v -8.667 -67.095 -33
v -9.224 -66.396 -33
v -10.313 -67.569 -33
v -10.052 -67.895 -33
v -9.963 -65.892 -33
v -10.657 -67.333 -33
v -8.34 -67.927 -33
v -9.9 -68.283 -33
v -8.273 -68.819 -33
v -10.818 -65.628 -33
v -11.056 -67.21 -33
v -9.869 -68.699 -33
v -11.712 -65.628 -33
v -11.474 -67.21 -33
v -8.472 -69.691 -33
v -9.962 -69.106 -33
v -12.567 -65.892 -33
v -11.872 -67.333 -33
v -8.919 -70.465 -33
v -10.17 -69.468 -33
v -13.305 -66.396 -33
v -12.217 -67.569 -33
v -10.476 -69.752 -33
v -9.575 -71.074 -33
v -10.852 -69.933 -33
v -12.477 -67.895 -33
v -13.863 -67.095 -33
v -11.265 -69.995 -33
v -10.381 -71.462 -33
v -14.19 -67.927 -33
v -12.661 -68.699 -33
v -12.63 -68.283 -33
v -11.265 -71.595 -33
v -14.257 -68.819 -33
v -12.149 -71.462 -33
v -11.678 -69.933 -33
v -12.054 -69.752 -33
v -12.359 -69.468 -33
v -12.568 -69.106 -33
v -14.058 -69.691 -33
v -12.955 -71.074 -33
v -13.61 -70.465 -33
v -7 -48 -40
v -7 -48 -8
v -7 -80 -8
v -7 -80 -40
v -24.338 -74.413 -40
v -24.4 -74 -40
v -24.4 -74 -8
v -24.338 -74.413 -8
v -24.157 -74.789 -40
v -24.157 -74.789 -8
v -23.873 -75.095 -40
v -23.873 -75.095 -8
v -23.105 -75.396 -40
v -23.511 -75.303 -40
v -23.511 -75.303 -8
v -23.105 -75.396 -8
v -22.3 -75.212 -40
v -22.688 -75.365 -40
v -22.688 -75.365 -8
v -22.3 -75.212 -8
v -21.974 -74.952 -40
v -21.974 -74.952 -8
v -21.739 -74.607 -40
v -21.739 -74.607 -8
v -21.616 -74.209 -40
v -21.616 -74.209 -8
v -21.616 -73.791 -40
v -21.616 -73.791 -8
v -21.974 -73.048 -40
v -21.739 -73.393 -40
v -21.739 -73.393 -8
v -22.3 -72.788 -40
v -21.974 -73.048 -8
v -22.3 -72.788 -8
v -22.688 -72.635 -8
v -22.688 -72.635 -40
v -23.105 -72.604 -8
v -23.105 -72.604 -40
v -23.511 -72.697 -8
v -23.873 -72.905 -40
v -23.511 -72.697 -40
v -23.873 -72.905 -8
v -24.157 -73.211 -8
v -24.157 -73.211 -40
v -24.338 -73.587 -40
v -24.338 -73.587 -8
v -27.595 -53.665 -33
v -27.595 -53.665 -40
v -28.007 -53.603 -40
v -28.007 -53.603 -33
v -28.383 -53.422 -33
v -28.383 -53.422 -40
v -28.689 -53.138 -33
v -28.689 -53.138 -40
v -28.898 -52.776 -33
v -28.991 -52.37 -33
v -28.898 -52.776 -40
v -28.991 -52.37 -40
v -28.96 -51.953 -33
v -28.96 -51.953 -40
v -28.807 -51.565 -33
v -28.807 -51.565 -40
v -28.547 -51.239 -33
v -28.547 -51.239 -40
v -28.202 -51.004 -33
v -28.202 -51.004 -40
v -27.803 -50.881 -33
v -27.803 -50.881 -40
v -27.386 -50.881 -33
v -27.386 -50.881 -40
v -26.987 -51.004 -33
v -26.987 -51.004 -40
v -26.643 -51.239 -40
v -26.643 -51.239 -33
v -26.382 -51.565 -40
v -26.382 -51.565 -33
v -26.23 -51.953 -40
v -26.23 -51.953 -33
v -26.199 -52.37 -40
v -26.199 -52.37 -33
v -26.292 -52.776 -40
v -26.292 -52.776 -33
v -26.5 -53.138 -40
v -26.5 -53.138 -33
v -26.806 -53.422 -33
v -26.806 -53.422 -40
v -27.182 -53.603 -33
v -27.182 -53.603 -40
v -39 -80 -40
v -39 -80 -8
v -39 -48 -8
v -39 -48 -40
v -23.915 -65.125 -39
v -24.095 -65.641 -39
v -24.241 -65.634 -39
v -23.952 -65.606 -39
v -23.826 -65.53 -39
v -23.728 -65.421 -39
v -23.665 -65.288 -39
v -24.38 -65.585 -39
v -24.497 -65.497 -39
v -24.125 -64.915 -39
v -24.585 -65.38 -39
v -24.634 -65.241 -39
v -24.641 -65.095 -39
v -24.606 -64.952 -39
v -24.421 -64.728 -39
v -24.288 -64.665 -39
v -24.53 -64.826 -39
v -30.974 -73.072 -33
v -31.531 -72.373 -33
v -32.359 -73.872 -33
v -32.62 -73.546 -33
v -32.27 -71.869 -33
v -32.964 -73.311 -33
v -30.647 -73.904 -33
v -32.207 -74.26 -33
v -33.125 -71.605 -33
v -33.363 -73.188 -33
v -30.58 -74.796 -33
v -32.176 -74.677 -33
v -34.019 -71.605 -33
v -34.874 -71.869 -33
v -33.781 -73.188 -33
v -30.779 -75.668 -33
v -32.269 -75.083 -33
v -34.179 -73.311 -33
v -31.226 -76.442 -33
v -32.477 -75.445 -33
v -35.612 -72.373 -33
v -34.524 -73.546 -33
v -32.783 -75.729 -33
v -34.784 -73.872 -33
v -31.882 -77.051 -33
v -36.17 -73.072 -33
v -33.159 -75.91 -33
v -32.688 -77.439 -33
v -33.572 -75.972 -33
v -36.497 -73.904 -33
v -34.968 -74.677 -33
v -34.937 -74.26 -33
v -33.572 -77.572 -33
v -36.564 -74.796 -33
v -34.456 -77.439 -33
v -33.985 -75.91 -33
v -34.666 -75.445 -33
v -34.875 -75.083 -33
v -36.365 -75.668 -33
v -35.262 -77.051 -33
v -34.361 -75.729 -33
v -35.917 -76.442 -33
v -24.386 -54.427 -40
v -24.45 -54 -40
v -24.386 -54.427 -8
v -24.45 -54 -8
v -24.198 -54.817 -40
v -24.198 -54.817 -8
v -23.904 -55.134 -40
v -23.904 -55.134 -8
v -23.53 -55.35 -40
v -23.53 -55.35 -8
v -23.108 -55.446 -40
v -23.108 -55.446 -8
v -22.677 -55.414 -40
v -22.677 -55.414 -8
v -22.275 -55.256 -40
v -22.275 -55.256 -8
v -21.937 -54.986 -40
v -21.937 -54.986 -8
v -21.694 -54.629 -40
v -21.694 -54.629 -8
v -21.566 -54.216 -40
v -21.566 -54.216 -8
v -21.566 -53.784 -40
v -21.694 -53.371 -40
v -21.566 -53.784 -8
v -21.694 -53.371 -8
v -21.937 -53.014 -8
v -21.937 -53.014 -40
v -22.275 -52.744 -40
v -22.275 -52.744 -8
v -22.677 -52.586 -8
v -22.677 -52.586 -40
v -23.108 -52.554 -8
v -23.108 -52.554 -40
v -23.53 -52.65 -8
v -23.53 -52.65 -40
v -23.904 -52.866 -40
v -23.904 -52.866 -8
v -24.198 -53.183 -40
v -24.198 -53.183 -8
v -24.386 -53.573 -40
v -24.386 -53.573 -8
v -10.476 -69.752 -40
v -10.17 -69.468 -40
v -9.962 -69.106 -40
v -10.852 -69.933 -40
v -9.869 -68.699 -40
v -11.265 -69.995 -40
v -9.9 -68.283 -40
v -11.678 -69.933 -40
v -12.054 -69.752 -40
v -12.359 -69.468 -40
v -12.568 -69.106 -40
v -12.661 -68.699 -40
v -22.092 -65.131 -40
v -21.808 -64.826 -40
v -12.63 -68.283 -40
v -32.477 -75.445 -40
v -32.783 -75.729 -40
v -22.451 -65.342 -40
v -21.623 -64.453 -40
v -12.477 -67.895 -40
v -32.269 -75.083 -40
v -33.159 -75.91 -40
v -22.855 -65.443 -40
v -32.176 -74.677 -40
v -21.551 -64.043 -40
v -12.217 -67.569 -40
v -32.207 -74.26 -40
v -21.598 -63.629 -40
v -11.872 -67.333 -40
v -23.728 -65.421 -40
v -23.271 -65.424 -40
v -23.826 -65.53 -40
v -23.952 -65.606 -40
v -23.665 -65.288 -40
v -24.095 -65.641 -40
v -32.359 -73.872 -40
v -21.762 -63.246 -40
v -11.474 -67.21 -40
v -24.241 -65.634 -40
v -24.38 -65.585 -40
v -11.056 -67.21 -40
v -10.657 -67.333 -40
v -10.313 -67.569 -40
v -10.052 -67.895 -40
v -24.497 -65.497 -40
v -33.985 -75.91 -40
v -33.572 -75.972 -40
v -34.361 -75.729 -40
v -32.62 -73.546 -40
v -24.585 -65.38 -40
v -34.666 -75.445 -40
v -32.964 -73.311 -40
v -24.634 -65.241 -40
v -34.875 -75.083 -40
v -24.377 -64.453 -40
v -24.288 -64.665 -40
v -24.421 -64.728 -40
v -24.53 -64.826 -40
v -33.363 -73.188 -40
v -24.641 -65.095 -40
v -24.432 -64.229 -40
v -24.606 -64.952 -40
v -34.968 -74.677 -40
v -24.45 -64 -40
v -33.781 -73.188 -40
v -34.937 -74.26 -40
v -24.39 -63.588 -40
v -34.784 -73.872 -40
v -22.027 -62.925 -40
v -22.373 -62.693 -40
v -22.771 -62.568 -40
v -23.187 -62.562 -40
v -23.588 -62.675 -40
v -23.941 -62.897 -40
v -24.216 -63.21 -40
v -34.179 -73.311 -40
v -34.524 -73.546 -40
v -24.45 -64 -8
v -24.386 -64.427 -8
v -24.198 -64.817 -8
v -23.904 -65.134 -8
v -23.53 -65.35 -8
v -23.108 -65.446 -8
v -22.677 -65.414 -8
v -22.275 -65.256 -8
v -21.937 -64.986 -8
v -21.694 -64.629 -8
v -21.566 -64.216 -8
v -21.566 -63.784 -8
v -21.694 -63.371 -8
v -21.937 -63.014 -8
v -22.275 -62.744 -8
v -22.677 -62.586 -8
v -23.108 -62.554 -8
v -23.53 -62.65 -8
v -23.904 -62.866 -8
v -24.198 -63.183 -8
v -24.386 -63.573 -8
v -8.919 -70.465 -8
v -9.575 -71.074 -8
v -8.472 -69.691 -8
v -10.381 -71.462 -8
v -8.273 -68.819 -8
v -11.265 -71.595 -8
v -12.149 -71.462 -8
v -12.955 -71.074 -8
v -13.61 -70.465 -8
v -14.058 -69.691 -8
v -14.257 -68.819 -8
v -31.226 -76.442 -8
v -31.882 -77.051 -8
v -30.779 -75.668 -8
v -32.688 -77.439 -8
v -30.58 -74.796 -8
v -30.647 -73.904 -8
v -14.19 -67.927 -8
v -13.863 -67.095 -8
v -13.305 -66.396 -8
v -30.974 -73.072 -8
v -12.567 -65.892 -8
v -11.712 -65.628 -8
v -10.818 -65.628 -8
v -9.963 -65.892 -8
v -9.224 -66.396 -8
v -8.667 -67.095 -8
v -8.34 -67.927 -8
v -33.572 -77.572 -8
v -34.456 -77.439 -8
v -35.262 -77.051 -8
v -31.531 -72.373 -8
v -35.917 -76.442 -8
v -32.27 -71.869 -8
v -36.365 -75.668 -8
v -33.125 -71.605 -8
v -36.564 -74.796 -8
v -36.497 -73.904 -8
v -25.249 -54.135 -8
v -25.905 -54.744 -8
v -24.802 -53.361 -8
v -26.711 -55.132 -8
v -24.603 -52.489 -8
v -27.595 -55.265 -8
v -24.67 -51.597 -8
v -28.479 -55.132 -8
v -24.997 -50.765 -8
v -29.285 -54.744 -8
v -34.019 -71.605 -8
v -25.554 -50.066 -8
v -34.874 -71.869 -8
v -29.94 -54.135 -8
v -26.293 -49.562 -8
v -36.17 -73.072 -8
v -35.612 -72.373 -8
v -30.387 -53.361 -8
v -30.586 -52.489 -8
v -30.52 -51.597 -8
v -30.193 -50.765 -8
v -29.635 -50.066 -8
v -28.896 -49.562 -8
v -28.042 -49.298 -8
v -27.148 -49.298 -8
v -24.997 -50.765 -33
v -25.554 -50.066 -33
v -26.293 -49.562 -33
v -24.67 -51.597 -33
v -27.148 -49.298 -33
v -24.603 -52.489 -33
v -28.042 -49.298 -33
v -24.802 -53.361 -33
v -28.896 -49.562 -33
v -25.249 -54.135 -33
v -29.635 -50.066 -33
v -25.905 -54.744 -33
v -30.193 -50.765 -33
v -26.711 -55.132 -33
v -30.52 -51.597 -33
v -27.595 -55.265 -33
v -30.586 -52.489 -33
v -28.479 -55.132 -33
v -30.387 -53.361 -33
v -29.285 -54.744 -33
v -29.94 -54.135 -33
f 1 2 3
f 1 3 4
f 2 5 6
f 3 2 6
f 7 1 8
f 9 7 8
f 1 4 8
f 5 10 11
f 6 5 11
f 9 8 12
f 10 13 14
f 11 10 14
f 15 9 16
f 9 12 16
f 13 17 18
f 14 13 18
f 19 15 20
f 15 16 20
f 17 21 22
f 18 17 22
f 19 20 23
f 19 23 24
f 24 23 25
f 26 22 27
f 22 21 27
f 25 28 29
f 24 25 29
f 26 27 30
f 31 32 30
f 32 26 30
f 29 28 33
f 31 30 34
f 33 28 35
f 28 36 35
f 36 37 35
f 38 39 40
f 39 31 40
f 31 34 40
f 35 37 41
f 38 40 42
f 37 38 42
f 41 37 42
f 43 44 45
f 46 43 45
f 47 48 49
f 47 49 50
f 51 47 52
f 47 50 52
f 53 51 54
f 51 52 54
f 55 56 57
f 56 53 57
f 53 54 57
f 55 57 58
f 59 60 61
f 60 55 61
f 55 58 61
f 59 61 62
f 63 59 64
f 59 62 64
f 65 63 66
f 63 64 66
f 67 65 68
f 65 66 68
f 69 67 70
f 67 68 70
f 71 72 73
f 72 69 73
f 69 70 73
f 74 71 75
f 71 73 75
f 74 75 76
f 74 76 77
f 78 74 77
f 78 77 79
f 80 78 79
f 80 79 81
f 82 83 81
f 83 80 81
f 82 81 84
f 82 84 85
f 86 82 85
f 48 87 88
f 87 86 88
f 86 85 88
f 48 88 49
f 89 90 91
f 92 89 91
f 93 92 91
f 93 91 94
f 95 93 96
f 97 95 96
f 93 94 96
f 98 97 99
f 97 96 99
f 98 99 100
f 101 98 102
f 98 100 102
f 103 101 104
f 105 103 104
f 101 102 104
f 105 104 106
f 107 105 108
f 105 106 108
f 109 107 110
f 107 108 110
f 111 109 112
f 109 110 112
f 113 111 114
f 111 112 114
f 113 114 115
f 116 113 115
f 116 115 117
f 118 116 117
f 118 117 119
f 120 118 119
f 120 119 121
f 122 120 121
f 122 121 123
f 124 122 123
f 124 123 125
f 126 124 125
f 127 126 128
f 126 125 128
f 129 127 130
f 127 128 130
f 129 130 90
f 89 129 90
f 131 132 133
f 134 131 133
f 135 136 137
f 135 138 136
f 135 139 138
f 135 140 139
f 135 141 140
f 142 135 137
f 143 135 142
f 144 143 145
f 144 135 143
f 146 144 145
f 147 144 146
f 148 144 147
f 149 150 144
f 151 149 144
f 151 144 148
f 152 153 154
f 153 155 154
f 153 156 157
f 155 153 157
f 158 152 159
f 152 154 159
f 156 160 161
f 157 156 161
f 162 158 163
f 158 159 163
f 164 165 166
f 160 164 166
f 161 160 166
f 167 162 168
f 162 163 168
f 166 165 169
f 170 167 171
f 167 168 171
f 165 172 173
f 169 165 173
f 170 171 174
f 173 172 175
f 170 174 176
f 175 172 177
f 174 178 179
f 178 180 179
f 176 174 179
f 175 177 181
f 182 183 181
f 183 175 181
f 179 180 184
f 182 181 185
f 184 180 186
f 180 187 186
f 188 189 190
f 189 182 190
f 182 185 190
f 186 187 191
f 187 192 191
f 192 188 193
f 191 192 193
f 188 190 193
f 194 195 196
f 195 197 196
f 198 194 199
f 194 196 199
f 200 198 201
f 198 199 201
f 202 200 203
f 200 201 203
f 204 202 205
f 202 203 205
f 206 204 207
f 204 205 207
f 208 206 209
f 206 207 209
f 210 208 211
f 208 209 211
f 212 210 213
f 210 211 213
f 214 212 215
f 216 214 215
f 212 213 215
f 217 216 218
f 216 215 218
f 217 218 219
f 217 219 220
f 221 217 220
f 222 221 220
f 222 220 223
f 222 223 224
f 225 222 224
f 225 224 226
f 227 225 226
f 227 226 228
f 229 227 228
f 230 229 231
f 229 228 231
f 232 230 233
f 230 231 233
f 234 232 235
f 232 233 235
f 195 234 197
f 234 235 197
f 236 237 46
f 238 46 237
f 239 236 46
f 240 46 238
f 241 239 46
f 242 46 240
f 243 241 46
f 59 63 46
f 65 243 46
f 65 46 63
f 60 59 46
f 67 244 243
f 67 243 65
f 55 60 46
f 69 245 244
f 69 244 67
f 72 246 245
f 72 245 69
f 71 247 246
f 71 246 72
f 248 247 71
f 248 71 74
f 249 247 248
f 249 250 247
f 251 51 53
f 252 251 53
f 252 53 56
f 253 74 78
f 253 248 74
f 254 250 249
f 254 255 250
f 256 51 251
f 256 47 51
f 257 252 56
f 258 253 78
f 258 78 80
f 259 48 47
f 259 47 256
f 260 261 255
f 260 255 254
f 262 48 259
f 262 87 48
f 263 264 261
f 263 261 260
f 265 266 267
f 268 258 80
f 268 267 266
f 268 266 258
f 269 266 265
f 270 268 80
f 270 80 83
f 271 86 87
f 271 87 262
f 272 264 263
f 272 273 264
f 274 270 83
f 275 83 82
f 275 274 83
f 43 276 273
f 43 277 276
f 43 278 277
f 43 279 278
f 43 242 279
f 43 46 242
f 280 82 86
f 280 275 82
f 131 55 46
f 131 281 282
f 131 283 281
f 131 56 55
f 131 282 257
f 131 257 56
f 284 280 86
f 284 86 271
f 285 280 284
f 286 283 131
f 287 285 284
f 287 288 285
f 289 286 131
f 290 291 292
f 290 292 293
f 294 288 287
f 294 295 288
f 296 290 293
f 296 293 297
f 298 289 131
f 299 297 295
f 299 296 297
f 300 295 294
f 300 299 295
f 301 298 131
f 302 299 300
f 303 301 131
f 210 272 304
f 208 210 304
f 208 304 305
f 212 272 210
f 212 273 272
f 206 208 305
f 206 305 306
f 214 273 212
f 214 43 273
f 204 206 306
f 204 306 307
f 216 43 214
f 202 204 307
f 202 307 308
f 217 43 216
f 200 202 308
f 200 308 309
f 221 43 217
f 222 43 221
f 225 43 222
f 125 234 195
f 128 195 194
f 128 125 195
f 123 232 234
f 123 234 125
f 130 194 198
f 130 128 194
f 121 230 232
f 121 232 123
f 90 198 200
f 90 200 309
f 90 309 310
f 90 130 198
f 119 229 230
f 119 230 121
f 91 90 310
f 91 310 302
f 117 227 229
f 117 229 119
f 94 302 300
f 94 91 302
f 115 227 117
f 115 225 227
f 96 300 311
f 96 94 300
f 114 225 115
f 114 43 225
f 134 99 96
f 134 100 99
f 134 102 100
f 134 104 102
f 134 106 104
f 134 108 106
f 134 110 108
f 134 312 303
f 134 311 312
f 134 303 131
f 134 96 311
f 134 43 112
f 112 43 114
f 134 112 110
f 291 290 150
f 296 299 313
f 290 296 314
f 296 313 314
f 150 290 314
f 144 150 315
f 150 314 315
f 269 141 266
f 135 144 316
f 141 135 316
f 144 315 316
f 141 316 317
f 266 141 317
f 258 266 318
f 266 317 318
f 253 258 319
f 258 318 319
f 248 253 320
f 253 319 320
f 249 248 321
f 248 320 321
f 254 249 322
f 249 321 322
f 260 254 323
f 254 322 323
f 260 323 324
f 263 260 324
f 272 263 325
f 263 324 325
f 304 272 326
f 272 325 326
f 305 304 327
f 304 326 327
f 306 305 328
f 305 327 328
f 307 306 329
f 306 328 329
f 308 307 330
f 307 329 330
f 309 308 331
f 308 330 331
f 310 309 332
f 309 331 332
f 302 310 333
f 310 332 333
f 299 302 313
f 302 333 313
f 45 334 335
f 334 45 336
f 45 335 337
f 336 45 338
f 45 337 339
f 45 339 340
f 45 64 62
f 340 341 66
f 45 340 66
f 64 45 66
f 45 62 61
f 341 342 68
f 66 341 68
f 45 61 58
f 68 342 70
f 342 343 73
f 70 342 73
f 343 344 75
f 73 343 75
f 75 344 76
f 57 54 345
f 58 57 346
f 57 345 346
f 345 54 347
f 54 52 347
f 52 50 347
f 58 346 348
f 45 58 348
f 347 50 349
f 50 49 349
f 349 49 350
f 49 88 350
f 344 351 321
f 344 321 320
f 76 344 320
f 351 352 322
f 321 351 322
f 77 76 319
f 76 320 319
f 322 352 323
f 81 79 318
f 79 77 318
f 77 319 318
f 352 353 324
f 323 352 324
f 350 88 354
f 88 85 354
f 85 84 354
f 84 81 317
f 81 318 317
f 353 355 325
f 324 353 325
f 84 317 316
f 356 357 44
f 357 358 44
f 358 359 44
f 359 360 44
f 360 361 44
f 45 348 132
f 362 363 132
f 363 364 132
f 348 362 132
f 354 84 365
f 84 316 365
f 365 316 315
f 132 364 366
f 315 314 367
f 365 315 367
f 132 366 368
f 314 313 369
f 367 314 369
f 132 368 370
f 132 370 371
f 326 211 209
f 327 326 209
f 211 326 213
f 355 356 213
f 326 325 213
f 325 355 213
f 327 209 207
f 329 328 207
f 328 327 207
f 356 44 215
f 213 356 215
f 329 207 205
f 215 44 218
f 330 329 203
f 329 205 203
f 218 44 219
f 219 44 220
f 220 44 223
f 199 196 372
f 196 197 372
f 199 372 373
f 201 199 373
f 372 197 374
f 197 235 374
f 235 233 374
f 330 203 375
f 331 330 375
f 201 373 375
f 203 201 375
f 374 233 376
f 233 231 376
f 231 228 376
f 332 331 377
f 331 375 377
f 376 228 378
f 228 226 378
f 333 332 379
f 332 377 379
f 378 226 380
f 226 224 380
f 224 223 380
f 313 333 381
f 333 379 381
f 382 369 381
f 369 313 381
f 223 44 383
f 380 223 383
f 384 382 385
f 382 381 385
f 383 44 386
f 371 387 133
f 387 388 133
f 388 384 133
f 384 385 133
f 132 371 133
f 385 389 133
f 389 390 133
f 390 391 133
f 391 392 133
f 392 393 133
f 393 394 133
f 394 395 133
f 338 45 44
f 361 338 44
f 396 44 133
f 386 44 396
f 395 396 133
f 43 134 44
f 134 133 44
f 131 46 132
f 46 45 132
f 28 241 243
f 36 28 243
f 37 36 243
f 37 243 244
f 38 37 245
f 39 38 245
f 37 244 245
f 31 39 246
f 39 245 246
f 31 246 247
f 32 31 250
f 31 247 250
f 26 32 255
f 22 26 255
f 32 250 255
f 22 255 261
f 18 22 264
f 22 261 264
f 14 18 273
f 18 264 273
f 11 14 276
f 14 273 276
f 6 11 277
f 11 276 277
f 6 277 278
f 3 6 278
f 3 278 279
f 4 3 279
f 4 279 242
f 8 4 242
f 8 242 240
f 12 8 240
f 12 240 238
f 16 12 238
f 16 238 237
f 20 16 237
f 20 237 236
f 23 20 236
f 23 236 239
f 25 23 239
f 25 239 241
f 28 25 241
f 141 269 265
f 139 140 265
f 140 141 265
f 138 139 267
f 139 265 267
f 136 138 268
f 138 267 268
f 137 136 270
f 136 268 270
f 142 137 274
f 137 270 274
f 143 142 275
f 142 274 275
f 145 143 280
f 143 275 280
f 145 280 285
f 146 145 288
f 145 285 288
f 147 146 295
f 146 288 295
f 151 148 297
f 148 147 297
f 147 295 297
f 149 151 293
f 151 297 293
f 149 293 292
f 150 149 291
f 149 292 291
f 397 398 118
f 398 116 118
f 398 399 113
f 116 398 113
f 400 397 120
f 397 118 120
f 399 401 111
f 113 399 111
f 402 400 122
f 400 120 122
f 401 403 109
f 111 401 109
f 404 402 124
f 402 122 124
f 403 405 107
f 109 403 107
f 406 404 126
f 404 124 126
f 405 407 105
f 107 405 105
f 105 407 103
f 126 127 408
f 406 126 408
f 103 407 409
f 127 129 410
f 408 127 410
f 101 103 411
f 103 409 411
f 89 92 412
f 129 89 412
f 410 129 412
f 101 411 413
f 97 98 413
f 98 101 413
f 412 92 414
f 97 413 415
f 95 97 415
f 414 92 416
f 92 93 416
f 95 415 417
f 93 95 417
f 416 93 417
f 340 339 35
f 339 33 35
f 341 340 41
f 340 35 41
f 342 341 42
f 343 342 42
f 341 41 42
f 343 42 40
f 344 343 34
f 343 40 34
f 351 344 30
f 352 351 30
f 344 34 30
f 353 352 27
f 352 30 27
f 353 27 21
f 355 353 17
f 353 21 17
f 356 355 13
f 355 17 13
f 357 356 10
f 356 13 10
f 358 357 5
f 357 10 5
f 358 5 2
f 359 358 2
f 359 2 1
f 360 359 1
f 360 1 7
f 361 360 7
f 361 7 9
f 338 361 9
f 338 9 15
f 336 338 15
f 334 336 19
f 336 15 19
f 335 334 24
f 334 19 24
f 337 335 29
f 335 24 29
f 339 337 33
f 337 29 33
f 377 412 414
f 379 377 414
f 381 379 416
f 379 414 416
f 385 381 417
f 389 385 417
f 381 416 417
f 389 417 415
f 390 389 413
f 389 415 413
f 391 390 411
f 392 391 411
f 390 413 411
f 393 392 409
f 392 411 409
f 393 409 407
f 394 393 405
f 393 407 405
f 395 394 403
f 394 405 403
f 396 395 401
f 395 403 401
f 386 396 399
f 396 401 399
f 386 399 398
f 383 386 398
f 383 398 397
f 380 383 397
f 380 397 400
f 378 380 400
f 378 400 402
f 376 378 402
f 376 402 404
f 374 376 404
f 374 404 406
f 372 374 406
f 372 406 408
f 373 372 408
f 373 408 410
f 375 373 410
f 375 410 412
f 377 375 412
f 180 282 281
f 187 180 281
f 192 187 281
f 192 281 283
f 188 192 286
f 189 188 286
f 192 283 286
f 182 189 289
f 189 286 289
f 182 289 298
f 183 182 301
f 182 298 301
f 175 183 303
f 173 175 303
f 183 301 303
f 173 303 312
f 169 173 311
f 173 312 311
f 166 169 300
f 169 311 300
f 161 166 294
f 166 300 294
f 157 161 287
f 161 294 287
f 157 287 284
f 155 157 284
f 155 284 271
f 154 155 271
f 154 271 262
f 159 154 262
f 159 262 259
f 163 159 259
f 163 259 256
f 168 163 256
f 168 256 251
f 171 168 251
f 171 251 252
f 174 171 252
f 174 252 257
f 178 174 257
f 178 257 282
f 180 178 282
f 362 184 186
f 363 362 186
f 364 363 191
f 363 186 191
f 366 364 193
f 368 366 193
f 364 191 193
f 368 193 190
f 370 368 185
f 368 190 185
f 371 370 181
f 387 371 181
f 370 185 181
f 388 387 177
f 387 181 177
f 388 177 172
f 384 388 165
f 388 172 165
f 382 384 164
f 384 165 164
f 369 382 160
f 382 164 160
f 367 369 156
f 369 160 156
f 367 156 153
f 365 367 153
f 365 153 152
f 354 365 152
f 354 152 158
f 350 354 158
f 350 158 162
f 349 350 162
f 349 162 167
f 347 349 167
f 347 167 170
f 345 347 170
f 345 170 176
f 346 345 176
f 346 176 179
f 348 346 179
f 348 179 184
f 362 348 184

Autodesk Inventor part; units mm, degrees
ref_plane "YZ Plane" through (0, 0, 0) normal (1, 0, 0) x (0, 1, 0)
ref_plane "XZ Plane" through (0, 0, 0) normal (0, 1, 0) x (-1, 0, 0)
ref_plane "XY Plane" through (0, 0, 0) normal (0, 0, 1) x (1, 0, 0)
ref_plane "Arbeitsebene1" through (0, 0, -8) normal (0, 0, -1) x (-1, 0, 0)
sketch "Skizze1" plane through (0, 0, -8) normal (0, 0, -1) x (-1, 0, 0)
  line L0 (-30, -73.2876) -> (-18.6416, -61.9292) projected
  line L1 (-18.6416, -61.9292) -> (-17.5809, -62.9898) projected
  line L2 (-17.5809, -62.9898) -> (-30, -75.4089) projected
  line L3 (-30, -75.4089) -> (-30, -76) projected
  arc A0 (-30, -76) -> (-26, -80) centre (-26, -76) ccw projected
  line L4 (-18, -80) -> (-26, -80) projected
  arc A1 (-18, -80) -> (-14, -76) centre (-18, -76) ccw projected
  line L5 (-14, -34) -> (-14, -76) projected
  arc A2 (-10, -30) -> (-14, -34) centre (-10, -34) ccw projected
  line L6 (-10, -30) -> (12, -30) projected
  arc A3 (16, -34) -> (12, -30) centre (12, -34) ccw projected
  line L7 (16, -34) -> (16, -76) projected
  arc A4 (16, -76) -> (20, -80) centre (20, -76) ccw projected
  line L8 (20, -80) -> (26, -80) projected
  arc A5 (26, -80) -> (30, -76) centre (26, -76) ccw projected
  line L9 (30, 28) -> (30, -76) projected
  line L10 (30, 28) -> (28, 30) projected
  line L11 (28, 30) -> (-28, 30) projected
  line L12 (-28, 30) -> (-30, 28) projected
  line L13 (-30, 28) -> (-30, -73.2876) projected
  circle A6 centre (-10, -25) radius 1.45 projected
  circle A7 centre (-10, 25) radius 1.45 projected
  circle A8 centre (10, 25) radius 1.45 projected
  circle A9 centre (10, -25) radius 1.45 projected
  circle A10 centre (25, -10) radius 1.45 projected
  circle A11 centre (-25, -10) radius 1.45 projected
  circle A12 centre (-25, 10) radius 1.45 projected
  circle A13 centre (25, 10) radius 1.45 projected
  circle A14 centre (-17.5, -17.5) radius 1.95 projected
  circle A15 centre (17.5, 17.5) radius 1.95 projected
  circle A16 centre (17.5, -17.5) radius 1.95 projected
  circle A17 centre (-17.5, 17.5) radius 1.95 projected
  circle A18 centre (-25, 25) radius 2.325 projected
  circle A19 centre (25, -25) radius 2.325 projected
  circle A20 centre (-25, -25) radius 2.325 projected
  circle A21 centre (25, 25) radius 2.325 projected
  circle A22 centre (0, 0) radius 16 projected
  circle A23 centre (23, -74) radius 3.75 projected
  circle A24 centre (23, -64) radius 1.45 projected
  circle A25 centre (23, -54) radius 1.45 projected
  line L14 (7, -80) -> (39, -80)
  line L15 (39, -80) -> (39, -48)
  line L16 (39, -48) -> (7, -48)
  line L17 (7, -48) -> (7, -80)
  line L18 (7, -80) -> (39, -48) construction
  line L19 (39, -80) -> (7, -48) construction
  circle A26 centre (23, -74) radius 1.4
  line L20 (34.516, -58.7768) -> (32.4244, -50.9708) projected
  line L21 (24.0592, -48.7293) -> (7.7293, -65.0592) projected
  line L22 (9.9708, -73.4244) -> (17.7768, -75.516) projected
  circle A27 centre (24.1439, -65.1439) radius 11.6667
  arc A28 (7.7293, -65.0592) -> (9.9708, -73.4244) centre (11.2649, -68.5948) ccw projected
  line L23 (34.516, -58.7768) -> (17.7768, -75.516) projected
  arc A29 (32.4244, -50.9708) -> (24.0592, -48.7293) centre (27.5948, -52.2649) ccw projected
  point P0 (0, 0)
  point P1 (26, -80)
  point P2 (16, -48)
  point P3 (16, -56.7886)
  point P4 (19.8793, -76.0794)
  point P5 (24.6629, -77.3611)
  point P6 (24.985, -48)
  point P7 (7, -65.985)
  point P8 (7, -71.2045)
  point P9 (30.2045, -48)
  dimension "d0" = 32
  dimension "d1" = 32
  dimension "d2" = 2.8
extrude "Extrusion1" add sketch "Skizze1" along normal blind 32 contours L16 A29 L20 L23 A27 L9 | L9 A27 A25 L21 A29 L16 | L16 L15 L14 A5 L9 A27 L23 L20 A29 | A29 L21 L7 L16 | A27 L23 L9 | L9 L23 A23 A27 L7 A25 | L7 L21 A28 L17 L16 | L23 A27 L9 | L9 A27 A23 L23 | A27 L7 L22 A28 L17 L21 | L7 A27 | L9 A5 L8 A4 L7 L22 L23 A27 A23 | L23 A23 | A23 A27 L23 | A27 L23 L22 L7 | A23 A27 | A23 A27 L23 | L14 L17 A28 L22 L7 A4
sketch "Skizze2" plane through (0, 0, -8) normal (0, 0, -1) x (-1, 0, 0)
  circle A0 centre (33.5719, -74.5719) radius 1.4
  line L0 (33.5719, -74.5719) -> (11.2649, -68.5948)
  line L1 (11.2649, -68.5948) -> (27.5948, -52.2649)
  line L2 (27.5948, -52.2649) -> (33.5719, -74.5719)
  line L3 (9.7029, -90.6426) -> (49.4807, -50.8648) construction
  line L4 (-4.7029, -89.492) -> (48.3301, -36.459) construction
  line L5 (39, -80) -> (39, -48) construction
  line L6 (7, -48) -> (7, -80) construction
  line L7 (39, -80) -> (7, -48) construction
  arc A1 (32.4244, -50.9708) -> (24.0592, -48.7293) centre (27.5948, -52.2649) ccw projected
  line L8 (24.0592, -48.7293) -> (7.7293, -65.0592) projected
  arc A2 (7.7293, -65.0592) -> (9.9708, -73.4244) centre (11.2649, -68.5948) ccw projected
  line L9 (9.9708, -73.4244) -> (32.2778, -79.4016) projected
  arc A3 (32.2778, -79.4016) -> (38.4016, -73.2778) centre (33.5719, -74.5719) ccw projected
  line L10 (38.4016, -73.2778) -> (32.4244, -50.9708) projected
  point P0 (0, 0)
  point P1 (24.4298, -55.4298)
  point P2 (24.1439, -65.1439)
hole "Bohrung1" at (-27.5948, -52.2649, -8) at (-11.2649, -68.5948, -8) at (-33.5719, -74.5719, -8) direction (0, 0, -1) diameter 2.8 end through all counterbore diameter 6 counterbore depth 25
sketch "Skizze4" plane through (-32.4244, -50.9708, -40) normal (-0.9659, 0.2588, 0) x (0, 0, 1)
  line L0 (6.9, -13.047) -> (-22.6933, -13.047)
  line L1 (6.9, -10.047) -> (-22.6933, -10.047)
  circle A0 centre (4.5207, -11.5212) radius 1.4
  point P0 (40, 57.626)
  dimension "d19" = 2.8
extrude "Extrusion3" [suppressed]
sketch "Skizze5" plane through (0, 0, -40) normal (0, 0, -1) x (-1, 0, 0)
  line L0 (9.9708, -73.4244) -> (17.7768, -75.516) projected
  line L1 (24.0592, -48.7293) -> (7.7293, -65.0592) projected
  line L2 (34.516, -58.7768) -> (32.4244, -50.9708) projected
  circle A0 centre (24.1439, -65.1439) radius 11.6667
  circle A1 centre (24.1439, -65.1439) radius 0.5
  point P0 (0, 0)
  dimension "d22" = 1
extrude "Extrusion4" cut sketch "Skizze5" against normal blind 1 contours A1
pattern_circular "Runde Anordnung2" [suppressed]
properties part number "30_XY_Sample_lightsheetarm_sample_screwadapter_v3"
